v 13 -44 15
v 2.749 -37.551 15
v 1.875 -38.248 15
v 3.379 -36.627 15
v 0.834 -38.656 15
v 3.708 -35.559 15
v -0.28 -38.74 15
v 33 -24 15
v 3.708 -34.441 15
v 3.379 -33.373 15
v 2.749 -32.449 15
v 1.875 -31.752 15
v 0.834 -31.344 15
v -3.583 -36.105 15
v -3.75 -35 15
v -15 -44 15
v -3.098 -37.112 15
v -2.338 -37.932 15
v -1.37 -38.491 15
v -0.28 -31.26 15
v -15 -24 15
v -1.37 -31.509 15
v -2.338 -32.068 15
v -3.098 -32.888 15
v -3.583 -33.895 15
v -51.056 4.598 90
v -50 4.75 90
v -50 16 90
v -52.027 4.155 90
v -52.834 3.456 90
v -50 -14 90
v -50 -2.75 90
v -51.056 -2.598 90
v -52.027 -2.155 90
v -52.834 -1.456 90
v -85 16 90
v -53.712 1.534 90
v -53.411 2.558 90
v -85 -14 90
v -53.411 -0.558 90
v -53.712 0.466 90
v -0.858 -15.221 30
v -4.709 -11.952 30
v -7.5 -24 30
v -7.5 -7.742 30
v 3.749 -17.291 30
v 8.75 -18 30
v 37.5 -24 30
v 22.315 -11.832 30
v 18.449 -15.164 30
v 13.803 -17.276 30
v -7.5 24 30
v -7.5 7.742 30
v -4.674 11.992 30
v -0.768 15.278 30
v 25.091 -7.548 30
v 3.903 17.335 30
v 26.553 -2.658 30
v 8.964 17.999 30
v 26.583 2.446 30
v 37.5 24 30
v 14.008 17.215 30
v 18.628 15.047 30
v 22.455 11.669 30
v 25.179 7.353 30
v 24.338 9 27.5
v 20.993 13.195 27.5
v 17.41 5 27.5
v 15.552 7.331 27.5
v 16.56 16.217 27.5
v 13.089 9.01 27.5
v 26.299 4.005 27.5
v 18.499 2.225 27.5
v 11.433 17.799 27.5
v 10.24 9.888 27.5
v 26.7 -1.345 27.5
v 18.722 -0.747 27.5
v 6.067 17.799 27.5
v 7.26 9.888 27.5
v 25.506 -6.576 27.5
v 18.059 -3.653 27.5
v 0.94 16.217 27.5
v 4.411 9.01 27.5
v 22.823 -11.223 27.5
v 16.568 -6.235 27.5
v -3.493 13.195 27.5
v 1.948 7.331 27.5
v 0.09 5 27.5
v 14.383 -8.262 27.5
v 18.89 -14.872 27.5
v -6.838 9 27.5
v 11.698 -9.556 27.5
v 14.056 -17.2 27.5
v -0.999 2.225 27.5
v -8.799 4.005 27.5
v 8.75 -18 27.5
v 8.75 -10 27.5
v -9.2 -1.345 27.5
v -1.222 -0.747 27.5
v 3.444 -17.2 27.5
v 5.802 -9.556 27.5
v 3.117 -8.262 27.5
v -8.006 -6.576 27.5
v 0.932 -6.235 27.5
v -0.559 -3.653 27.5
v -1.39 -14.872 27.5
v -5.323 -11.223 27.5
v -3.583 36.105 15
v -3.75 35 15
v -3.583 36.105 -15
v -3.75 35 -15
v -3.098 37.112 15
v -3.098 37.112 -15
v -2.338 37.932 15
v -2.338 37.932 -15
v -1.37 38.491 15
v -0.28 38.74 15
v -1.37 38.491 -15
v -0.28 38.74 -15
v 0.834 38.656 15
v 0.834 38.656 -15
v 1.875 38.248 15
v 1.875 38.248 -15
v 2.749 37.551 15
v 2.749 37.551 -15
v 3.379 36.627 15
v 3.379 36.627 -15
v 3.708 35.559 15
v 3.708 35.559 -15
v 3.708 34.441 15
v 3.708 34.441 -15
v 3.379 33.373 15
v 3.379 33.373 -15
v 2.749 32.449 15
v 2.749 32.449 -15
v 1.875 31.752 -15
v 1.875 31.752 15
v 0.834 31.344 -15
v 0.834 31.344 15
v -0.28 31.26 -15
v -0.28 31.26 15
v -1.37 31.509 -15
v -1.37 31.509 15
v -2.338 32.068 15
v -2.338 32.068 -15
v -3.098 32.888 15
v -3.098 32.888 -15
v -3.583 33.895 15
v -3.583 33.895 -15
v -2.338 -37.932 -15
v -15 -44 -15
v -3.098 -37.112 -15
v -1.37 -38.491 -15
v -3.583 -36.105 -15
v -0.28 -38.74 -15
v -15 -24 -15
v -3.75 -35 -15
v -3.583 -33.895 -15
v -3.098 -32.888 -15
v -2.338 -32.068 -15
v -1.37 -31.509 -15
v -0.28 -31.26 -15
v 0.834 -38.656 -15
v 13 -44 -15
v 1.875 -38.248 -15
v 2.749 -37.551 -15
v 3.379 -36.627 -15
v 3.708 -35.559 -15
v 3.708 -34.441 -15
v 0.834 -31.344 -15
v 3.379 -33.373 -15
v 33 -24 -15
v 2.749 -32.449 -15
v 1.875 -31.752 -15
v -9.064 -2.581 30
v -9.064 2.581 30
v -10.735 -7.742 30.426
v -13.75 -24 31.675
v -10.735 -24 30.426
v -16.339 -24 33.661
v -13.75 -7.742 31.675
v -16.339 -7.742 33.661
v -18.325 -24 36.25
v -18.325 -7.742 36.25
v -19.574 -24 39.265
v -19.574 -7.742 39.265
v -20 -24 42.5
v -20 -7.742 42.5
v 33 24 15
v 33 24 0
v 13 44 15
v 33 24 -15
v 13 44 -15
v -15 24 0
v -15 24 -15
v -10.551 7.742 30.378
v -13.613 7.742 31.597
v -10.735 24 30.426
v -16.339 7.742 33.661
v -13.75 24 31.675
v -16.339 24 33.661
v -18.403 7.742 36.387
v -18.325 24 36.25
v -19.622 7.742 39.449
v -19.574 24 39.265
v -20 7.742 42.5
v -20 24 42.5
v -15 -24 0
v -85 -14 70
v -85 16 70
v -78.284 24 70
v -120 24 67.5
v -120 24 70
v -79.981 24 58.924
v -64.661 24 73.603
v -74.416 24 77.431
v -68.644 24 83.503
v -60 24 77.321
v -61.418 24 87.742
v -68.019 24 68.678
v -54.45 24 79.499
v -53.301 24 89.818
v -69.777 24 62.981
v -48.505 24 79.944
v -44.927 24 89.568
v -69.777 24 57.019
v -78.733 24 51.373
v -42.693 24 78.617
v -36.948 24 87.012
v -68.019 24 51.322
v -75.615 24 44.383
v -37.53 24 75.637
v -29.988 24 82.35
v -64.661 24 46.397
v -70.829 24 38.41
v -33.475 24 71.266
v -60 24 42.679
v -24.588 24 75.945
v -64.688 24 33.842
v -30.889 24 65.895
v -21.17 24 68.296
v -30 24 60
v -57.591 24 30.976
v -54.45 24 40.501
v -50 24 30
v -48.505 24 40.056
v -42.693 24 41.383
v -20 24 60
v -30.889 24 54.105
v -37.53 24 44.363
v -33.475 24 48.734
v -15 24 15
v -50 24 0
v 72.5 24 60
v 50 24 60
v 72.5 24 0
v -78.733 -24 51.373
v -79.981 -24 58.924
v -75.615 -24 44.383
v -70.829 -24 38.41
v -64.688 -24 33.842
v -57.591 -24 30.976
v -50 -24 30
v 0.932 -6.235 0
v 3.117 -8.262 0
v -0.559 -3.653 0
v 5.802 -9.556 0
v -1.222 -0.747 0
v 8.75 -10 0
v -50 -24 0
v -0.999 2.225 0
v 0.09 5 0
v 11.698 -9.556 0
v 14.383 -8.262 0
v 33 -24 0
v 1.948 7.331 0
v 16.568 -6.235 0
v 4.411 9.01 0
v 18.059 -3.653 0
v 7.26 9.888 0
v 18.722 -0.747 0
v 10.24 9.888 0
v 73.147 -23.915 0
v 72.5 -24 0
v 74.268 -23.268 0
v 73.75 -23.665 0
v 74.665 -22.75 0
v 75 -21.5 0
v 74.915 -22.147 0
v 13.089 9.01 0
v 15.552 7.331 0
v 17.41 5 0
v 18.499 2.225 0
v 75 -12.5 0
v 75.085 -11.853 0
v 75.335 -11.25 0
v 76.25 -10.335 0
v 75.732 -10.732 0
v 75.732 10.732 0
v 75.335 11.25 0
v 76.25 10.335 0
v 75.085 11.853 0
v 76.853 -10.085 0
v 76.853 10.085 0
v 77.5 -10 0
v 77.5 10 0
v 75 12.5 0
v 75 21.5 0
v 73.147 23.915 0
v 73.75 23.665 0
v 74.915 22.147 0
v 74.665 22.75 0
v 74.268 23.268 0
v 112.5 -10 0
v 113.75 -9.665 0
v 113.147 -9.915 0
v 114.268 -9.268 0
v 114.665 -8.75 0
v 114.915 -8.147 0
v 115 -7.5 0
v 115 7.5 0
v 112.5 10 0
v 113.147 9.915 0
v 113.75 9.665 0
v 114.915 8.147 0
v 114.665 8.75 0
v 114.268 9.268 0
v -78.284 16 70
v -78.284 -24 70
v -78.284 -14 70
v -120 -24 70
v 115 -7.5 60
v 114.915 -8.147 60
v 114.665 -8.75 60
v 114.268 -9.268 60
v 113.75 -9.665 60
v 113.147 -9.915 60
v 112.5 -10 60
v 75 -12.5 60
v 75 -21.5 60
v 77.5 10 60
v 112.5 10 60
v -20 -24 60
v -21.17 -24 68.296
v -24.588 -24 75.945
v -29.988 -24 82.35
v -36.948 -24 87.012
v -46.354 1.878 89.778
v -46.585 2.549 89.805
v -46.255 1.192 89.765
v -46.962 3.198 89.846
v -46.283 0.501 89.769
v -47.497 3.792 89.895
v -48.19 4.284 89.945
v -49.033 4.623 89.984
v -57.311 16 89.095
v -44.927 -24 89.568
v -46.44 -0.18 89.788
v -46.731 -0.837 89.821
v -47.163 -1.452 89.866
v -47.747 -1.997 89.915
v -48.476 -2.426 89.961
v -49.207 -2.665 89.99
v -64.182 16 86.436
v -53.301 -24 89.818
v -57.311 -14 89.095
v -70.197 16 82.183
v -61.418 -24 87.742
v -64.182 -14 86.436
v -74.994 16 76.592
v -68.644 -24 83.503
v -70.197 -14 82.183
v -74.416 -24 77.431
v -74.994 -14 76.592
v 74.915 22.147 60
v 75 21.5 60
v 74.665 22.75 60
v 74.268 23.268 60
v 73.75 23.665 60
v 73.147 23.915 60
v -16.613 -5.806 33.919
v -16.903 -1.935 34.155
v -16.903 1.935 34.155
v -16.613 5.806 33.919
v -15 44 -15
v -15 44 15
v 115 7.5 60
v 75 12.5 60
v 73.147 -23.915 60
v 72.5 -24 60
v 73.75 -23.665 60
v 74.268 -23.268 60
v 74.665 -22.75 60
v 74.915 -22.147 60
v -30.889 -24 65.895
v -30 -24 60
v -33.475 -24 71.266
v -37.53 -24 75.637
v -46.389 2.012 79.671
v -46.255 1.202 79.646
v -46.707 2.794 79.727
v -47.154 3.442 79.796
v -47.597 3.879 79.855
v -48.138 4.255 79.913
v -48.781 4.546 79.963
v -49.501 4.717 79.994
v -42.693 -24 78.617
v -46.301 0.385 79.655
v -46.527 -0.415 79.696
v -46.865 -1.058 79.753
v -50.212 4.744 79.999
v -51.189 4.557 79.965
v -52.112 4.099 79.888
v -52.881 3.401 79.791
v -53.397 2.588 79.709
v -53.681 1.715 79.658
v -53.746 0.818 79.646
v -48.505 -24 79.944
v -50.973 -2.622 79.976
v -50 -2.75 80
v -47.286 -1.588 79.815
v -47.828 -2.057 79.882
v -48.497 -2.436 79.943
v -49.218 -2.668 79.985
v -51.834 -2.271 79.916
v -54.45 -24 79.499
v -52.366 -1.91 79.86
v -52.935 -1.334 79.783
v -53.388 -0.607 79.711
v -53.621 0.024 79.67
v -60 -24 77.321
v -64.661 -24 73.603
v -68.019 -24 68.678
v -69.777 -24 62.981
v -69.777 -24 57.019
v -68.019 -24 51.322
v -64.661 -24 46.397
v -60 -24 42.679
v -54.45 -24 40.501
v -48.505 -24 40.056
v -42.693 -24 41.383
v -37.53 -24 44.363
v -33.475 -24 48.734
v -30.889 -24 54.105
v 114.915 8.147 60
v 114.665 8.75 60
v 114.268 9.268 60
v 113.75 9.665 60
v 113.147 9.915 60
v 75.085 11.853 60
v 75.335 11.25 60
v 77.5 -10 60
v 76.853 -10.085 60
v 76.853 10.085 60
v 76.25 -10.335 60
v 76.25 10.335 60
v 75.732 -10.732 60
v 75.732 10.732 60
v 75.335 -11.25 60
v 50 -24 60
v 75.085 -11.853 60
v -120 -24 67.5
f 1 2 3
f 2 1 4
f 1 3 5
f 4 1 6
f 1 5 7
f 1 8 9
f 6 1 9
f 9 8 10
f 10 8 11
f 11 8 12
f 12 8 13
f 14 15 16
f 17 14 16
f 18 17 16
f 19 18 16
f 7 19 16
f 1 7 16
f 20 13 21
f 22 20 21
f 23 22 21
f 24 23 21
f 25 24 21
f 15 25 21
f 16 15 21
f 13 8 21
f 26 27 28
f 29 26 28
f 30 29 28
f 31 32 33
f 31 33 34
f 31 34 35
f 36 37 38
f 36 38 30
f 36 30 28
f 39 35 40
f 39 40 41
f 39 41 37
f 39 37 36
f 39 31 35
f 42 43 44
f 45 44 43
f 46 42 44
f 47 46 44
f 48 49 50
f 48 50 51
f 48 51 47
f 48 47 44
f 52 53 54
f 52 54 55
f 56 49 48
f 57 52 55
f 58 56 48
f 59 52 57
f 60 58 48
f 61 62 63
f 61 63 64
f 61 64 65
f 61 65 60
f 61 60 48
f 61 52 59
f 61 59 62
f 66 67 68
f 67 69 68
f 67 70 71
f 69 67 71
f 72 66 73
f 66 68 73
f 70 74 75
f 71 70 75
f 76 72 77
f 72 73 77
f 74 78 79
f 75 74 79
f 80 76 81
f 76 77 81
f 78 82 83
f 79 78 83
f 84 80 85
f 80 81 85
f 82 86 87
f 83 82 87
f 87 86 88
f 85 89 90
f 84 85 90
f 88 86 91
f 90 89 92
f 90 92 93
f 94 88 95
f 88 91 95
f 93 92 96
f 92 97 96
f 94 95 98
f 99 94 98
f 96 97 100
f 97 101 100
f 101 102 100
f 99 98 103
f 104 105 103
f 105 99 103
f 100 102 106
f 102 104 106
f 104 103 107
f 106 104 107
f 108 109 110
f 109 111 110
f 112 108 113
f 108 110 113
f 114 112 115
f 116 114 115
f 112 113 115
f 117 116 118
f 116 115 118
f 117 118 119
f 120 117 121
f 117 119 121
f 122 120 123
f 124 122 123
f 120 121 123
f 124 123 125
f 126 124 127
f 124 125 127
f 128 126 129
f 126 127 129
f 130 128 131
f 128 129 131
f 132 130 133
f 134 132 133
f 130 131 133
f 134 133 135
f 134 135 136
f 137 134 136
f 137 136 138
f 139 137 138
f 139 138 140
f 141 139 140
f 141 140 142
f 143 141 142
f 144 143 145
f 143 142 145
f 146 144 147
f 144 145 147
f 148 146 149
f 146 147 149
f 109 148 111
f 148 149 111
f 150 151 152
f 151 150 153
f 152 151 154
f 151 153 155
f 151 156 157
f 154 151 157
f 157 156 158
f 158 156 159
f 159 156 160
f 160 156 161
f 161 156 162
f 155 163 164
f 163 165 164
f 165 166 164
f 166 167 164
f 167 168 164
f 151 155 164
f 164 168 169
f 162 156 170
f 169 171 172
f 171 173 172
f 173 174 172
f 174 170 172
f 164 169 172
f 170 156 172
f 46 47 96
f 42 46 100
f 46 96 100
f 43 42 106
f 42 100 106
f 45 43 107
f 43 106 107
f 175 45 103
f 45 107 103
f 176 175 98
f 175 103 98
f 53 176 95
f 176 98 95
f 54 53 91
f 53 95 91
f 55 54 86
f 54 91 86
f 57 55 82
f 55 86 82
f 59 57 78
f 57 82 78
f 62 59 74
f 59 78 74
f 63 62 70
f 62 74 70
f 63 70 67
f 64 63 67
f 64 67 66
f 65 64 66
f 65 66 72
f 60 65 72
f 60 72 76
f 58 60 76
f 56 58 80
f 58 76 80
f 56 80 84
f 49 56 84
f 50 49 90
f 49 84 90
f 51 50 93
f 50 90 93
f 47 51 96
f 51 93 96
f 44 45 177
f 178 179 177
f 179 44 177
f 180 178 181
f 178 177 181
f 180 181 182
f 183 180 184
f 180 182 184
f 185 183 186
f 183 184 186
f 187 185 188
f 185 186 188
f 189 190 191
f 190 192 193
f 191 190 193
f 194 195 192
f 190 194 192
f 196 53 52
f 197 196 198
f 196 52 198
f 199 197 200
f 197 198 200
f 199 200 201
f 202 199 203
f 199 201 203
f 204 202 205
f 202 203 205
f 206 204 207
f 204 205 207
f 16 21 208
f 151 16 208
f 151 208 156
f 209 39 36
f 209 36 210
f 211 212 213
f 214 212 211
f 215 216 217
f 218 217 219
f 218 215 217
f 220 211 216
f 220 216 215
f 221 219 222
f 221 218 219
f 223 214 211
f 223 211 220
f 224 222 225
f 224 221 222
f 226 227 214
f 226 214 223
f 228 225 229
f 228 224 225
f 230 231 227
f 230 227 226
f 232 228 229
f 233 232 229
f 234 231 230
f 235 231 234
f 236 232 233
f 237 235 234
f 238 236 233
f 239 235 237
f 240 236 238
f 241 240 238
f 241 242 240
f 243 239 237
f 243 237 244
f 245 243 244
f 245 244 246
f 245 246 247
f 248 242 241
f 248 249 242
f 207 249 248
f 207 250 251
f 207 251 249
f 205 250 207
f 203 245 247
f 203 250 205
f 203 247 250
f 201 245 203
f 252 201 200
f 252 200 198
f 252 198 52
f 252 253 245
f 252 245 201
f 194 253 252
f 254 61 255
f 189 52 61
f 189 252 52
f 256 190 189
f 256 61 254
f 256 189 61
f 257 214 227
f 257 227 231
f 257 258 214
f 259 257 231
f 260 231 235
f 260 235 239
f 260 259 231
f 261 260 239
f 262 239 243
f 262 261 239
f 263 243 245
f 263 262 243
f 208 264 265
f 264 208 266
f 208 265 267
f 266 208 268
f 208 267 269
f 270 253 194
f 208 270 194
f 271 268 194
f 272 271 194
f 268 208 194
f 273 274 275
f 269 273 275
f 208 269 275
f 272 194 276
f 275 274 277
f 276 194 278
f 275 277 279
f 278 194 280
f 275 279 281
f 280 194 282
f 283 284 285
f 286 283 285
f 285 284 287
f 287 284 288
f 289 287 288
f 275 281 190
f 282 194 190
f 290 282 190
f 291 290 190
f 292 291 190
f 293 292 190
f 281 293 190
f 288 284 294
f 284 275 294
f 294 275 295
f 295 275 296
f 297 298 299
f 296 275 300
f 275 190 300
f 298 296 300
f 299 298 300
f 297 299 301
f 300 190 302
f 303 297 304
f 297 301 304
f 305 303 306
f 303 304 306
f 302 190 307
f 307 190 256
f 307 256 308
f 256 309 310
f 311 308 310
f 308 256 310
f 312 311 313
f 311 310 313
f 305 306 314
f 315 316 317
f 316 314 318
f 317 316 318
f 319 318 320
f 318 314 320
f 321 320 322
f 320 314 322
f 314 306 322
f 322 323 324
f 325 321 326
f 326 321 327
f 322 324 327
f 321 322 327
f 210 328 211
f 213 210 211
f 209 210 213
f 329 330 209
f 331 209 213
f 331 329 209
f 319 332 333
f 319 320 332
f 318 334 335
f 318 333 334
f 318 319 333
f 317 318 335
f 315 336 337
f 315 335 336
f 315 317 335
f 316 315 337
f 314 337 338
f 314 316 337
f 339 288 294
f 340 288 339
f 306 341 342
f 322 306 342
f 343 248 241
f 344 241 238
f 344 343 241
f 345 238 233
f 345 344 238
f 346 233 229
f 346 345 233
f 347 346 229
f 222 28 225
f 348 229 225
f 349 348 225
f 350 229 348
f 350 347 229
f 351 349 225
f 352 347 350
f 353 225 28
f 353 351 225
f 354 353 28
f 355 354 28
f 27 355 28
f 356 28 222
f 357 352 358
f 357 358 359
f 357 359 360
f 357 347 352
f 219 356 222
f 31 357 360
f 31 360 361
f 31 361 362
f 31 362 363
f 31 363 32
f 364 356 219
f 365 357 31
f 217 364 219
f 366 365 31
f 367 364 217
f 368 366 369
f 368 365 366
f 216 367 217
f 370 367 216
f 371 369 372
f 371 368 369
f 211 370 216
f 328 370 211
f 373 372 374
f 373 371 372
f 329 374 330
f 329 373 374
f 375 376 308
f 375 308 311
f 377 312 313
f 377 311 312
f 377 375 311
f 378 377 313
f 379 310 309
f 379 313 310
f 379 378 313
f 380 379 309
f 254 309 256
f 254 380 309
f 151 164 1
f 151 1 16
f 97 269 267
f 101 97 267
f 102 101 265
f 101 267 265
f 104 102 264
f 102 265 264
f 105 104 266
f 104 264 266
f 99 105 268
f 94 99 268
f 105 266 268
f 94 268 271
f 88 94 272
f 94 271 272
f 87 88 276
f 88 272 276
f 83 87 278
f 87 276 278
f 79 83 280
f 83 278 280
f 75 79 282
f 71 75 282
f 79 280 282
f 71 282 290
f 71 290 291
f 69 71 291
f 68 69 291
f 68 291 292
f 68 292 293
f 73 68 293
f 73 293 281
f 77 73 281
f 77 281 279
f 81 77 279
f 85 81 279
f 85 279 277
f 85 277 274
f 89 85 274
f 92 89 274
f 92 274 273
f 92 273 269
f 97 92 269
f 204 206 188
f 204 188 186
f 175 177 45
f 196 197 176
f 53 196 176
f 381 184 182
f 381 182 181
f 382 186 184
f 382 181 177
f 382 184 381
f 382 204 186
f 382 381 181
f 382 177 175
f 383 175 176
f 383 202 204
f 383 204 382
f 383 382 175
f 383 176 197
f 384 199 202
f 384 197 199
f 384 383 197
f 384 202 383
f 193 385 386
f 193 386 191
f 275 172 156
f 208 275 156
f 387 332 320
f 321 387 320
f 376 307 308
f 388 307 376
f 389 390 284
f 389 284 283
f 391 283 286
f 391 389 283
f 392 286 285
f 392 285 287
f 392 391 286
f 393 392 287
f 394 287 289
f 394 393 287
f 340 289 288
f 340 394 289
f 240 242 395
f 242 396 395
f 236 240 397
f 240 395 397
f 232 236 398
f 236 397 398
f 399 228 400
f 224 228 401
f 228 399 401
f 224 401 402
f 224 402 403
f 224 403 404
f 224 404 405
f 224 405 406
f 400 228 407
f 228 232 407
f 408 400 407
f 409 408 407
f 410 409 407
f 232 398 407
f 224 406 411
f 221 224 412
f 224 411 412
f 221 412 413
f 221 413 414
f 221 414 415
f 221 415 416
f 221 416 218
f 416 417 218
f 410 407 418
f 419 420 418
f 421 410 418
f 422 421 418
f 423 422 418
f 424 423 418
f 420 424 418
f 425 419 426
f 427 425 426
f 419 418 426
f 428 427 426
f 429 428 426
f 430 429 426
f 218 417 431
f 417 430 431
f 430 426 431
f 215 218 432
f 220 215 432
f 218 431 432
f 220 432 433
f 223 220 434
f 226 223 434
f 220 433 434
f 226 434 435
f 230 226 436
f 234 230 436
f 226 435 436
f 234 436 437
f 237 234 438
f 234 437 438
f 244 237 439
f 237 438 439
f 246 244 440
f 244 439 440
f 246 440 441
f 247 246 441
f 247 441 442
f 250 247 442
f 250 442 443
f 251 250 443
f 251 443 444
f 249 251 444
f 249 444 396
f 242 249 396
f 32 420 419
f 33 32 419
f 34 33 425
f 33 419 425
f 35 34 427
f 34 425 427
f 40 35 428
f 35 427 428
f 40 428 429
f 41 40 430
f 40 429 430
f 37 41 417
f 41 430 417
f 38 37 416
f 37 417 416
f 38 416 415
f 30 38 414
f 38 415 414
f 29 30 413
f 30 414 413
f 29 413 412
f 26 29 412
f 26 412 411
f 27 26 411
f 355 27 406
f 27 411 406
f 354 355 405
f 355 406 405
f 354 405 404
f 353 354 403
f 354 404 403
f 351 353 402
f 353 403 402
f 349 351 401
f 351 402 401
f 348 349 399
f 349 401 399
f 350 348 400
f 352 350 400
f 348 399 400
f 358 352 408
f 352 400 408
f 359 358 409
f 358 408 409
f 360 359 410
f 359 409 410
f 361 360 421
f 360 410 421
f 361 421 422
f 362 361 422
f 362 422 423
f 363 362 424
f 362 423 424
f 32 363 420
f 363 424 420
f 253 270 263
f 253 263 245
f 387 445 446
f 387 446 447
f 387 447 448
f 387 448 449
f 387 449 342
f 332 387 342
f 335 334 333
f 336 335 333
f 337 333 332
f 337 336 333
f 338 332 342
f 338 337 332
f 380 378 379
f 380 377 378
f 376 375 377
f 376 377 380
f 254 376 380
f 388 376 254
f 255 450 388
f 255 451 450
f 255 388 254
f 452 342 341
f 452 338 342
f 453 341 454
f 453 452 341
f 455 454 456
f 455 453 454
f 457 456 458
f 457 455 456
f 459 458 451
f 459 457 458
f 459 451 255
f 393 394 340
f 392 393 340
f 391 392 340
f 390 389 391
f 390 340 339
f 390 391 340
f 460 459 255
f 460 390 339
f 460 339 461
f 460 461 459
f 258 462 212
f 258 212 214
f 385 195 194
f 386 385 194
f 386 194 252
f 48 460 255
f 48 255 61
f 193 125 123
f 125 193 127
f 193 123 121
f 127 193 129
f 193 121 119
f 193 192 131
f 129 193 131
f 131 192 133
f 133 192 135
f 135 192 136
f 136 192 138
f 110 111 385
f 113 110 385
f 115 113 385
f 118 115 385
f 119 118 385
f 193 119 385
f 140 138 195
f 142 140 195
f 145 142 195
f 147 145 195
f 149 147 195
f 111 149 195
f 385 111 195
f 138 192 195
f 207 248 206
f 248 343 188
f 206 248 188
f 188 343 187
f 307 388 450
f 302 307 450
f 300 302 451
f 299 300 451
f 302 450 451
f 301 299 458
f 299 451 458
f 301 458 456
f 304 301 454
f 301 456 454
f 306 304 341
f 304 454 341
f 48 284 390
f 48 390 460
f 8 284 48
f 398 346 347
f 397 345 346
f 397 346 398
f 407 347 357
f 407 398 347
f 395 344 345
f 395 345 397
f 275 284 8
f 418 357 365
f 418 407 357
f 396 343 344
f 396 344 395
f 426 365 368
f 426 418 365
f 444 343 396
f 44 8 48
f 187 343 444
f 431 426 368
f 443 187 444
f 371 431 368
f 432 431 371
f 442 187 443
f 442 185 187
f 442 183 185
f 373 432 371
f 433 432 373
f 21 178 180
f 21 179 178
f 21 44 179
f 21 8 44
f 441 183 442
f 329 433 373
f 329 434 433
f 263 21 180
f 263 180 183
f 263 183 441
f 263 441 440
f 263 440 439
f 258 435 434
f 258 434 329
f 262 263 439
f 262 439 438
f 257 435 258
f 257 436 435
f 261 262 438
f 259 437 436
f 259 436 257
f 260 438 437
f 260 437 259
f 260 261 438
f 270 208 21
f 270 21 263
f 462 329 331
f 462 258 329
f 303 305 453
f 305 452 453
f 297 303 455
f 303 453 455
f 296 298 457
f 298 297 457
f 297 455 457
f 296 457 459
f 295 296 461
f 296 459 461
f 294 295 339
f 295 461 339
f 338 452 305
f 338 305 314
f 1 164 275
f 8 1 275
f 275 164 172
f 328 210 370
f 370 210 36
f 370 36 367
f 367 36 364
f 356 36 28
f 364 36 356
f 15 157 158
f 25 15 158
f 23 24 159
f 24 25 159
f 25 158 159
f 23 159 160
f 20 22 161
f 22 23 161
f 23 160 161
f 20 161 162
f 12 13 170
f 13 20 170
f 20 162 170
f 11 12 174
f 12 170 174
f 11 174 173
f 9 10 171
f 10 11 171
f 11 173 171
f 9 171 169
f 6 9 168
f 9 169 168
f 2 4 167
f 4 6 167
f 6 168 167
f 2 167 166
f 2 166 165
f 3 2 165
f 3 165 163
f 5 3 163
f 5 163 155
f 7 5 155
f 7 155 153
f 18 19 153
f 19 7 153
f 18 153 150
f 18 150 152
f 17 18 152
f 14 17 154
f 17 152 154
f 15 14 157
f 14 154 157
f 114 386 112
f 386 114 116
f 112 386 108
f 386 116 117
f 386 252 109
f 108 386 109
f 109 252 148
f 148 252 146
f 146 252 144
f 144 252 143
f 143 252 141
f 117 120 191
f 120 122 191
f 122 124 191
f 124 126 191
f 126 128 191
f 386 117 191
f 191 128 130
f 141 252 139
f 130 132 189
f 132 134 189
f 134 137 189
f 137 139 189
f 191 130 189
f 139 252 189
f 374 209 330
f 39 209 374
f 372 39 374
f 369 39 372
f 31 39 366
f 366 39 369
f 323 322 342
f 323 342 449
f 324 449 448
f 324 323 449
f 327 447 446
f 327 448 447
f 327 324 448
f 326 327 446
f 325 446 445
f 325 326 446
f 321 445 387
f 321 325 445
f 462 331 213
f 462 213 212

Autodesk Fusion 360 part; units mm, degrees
sketch "Sketch1" plane through (0, 0, 0) normal (0, 0, 1) x (1, 0, 0)
  line L0 (50, -24) -> (-50, -24)
  line L1 (-50, -24) -> (-50, 24)
  line L2 (-50, 24) -> (50, 24)
  line L3 (50, 24) -> (50, -24)
  line L4 (50, -24) -> (-50, 24) construction
  line L5 (-50, -24) -> (50, 24) construction
  dimension "d1" = 100
  dimension "d2" = 48
extrude "Extrude1" add sketch "Sketch1" along normal blind 30
sketch "Sketch2" plane through (0, -24, 0) normal (0, -1, 0) x (1, 0, 0)
  line L0 (-50, 0) -> (50, 0)
  line L1 (50, 0) -> (50, 30)
  line L2 (50, 30) -> (-50, 30)
  line L3 (-50, 30) -> (-50, 0)
  line L4 (50, 0) -> (75, 0)
  line L5 (75, 0) -> (75, 60)
  line L6 (75, 60) -> (50, 60)
  line L7 (50, 60) -> (50, 0)
  line L8 (75, 60) -> (115, 60)
  line L9 (115, 60) -> (115, 0)
  line L10 (115, 0) -> (75, 0)
  line L11 (75, 0) -> (75, 60)
  line L12 (50, 60) -> (37.5, 30)
  circle A0 centre (-50, 60) radius 30
  circle A1 centre (-50, 60) radius 20
  line L13 (-15, 0) -> (33, 0)
  line L14 (33, 0) -> (33, 15)
  line L15 (33, 15) -> (-15, 15)
  line L16 (-15, 15) -> (-15, 0)
  line L17 (-50, 60) -> (-50, 70)
  line L18 (-50, 70) -> (-120, 70)
  line L19 (-120, 70) -> (-120, 67.5)
  line L20 (-120, 67.5) -> (-50, 52.5)
  line L21 (-50, 52.5) -> (-50, 60)
  line L22 (-50, 90) -> (-85, 90)
  line L23 (-85, 90) -> (-85, 70)
  line L24 (-85, 70) -> (-50, 70)
  line L25 (-50, 70) -> (-50, 90)
  line L26 (-20, 60) -> (-20, 30)
  dimension "d5" = 25
  dimension "d6" = 60
  dimension "d7" = 40
  dimension "d8" = 60
  dimension "d9" = 40
  dimension "d10" = 48
  dimension "d11" = 15
  dimension "d12" = 10
  dimension "d13" = 70
  dimension "d14" = 7.5
  dimension "d15" = 35
  dimension "d16" = 12.5
extrude "Extrude2" add sketch "Sketch2" against normal blind 48 contours L2 A0 L26 | A0 A1 L20 L25 | A0 L18 L19 L20 L24 | A0 A1 L18 L20 L24 | L1 L4 L5 L6 L7 L11 | L2 L7 L12 | A0 A1 L18 L24 L25
extrude "Extrude3" add sketch "Sketch2" against normal blind 20 from surface at -14 contours L5 L8 L9 L10 L11
extrude "Extrude4" add sketch "Sketch2" against normal blind 30 from surface at -10 contours A0 L18 L22 L23 L24
extrude "Extrude5" add sketch "Sketch2" along normal blind 20 contours L0 L13 L14 L15 L16
sketch "Sketch3" plane through (0, 0, 15) normal (0, 0, 1) x (-1, 0, 0)
  line L0 (-33, 24) -> (15, 24)
  line L1 (15, 24) -> (15, 44)
  line L2 (15, 44) -> (-33, 44)
  line L3 (-33, 44) -> (-33, 24)
  line L4 (-33, 24) -> (-3.4619, 53.5381)
  line L5 (-33, 24) -> (8.7732, 24) construction
  circle A0 centre (0, 35) radius 3.75
  dimension "d27" = 45
  dimension "d28" = 7.5
  dimension "d29" = 15
extrude "Extrude6" cut sketch "Sketch3" against normal blind 40 contours L2 L3 L4 | A0
mirror "Mirror1" about plane through (0, 0, 0) normal (0, 0, -1) of "Extrude5", "Extrude6"
mirror "Mirror2" about plane through (0, 0, 0) normal (0, 1, 0) of "Extrude5", "Mirror1"
hole "Hole1" at (-50, 1, 90) direction (0, 0, -1) diameter 7.5 depth 30 tip angle 180
hole "Hole2" at (8.75, 0, 30) direction (0, 0, -1) diameter 20 depth 60 tip angle 180 counterbore diameter 36 counterbore depth 2.5
fillet "Fillet1" radius 12.5 1 edges at (-20, 0, 30)
fillet "Fillet2" radius 2.5 6 edges at (75, -10, 30) (75, 10, 30) (75, 24, 30) (115, 10, 30) (115, -10, 30) (75, -24, 30)
